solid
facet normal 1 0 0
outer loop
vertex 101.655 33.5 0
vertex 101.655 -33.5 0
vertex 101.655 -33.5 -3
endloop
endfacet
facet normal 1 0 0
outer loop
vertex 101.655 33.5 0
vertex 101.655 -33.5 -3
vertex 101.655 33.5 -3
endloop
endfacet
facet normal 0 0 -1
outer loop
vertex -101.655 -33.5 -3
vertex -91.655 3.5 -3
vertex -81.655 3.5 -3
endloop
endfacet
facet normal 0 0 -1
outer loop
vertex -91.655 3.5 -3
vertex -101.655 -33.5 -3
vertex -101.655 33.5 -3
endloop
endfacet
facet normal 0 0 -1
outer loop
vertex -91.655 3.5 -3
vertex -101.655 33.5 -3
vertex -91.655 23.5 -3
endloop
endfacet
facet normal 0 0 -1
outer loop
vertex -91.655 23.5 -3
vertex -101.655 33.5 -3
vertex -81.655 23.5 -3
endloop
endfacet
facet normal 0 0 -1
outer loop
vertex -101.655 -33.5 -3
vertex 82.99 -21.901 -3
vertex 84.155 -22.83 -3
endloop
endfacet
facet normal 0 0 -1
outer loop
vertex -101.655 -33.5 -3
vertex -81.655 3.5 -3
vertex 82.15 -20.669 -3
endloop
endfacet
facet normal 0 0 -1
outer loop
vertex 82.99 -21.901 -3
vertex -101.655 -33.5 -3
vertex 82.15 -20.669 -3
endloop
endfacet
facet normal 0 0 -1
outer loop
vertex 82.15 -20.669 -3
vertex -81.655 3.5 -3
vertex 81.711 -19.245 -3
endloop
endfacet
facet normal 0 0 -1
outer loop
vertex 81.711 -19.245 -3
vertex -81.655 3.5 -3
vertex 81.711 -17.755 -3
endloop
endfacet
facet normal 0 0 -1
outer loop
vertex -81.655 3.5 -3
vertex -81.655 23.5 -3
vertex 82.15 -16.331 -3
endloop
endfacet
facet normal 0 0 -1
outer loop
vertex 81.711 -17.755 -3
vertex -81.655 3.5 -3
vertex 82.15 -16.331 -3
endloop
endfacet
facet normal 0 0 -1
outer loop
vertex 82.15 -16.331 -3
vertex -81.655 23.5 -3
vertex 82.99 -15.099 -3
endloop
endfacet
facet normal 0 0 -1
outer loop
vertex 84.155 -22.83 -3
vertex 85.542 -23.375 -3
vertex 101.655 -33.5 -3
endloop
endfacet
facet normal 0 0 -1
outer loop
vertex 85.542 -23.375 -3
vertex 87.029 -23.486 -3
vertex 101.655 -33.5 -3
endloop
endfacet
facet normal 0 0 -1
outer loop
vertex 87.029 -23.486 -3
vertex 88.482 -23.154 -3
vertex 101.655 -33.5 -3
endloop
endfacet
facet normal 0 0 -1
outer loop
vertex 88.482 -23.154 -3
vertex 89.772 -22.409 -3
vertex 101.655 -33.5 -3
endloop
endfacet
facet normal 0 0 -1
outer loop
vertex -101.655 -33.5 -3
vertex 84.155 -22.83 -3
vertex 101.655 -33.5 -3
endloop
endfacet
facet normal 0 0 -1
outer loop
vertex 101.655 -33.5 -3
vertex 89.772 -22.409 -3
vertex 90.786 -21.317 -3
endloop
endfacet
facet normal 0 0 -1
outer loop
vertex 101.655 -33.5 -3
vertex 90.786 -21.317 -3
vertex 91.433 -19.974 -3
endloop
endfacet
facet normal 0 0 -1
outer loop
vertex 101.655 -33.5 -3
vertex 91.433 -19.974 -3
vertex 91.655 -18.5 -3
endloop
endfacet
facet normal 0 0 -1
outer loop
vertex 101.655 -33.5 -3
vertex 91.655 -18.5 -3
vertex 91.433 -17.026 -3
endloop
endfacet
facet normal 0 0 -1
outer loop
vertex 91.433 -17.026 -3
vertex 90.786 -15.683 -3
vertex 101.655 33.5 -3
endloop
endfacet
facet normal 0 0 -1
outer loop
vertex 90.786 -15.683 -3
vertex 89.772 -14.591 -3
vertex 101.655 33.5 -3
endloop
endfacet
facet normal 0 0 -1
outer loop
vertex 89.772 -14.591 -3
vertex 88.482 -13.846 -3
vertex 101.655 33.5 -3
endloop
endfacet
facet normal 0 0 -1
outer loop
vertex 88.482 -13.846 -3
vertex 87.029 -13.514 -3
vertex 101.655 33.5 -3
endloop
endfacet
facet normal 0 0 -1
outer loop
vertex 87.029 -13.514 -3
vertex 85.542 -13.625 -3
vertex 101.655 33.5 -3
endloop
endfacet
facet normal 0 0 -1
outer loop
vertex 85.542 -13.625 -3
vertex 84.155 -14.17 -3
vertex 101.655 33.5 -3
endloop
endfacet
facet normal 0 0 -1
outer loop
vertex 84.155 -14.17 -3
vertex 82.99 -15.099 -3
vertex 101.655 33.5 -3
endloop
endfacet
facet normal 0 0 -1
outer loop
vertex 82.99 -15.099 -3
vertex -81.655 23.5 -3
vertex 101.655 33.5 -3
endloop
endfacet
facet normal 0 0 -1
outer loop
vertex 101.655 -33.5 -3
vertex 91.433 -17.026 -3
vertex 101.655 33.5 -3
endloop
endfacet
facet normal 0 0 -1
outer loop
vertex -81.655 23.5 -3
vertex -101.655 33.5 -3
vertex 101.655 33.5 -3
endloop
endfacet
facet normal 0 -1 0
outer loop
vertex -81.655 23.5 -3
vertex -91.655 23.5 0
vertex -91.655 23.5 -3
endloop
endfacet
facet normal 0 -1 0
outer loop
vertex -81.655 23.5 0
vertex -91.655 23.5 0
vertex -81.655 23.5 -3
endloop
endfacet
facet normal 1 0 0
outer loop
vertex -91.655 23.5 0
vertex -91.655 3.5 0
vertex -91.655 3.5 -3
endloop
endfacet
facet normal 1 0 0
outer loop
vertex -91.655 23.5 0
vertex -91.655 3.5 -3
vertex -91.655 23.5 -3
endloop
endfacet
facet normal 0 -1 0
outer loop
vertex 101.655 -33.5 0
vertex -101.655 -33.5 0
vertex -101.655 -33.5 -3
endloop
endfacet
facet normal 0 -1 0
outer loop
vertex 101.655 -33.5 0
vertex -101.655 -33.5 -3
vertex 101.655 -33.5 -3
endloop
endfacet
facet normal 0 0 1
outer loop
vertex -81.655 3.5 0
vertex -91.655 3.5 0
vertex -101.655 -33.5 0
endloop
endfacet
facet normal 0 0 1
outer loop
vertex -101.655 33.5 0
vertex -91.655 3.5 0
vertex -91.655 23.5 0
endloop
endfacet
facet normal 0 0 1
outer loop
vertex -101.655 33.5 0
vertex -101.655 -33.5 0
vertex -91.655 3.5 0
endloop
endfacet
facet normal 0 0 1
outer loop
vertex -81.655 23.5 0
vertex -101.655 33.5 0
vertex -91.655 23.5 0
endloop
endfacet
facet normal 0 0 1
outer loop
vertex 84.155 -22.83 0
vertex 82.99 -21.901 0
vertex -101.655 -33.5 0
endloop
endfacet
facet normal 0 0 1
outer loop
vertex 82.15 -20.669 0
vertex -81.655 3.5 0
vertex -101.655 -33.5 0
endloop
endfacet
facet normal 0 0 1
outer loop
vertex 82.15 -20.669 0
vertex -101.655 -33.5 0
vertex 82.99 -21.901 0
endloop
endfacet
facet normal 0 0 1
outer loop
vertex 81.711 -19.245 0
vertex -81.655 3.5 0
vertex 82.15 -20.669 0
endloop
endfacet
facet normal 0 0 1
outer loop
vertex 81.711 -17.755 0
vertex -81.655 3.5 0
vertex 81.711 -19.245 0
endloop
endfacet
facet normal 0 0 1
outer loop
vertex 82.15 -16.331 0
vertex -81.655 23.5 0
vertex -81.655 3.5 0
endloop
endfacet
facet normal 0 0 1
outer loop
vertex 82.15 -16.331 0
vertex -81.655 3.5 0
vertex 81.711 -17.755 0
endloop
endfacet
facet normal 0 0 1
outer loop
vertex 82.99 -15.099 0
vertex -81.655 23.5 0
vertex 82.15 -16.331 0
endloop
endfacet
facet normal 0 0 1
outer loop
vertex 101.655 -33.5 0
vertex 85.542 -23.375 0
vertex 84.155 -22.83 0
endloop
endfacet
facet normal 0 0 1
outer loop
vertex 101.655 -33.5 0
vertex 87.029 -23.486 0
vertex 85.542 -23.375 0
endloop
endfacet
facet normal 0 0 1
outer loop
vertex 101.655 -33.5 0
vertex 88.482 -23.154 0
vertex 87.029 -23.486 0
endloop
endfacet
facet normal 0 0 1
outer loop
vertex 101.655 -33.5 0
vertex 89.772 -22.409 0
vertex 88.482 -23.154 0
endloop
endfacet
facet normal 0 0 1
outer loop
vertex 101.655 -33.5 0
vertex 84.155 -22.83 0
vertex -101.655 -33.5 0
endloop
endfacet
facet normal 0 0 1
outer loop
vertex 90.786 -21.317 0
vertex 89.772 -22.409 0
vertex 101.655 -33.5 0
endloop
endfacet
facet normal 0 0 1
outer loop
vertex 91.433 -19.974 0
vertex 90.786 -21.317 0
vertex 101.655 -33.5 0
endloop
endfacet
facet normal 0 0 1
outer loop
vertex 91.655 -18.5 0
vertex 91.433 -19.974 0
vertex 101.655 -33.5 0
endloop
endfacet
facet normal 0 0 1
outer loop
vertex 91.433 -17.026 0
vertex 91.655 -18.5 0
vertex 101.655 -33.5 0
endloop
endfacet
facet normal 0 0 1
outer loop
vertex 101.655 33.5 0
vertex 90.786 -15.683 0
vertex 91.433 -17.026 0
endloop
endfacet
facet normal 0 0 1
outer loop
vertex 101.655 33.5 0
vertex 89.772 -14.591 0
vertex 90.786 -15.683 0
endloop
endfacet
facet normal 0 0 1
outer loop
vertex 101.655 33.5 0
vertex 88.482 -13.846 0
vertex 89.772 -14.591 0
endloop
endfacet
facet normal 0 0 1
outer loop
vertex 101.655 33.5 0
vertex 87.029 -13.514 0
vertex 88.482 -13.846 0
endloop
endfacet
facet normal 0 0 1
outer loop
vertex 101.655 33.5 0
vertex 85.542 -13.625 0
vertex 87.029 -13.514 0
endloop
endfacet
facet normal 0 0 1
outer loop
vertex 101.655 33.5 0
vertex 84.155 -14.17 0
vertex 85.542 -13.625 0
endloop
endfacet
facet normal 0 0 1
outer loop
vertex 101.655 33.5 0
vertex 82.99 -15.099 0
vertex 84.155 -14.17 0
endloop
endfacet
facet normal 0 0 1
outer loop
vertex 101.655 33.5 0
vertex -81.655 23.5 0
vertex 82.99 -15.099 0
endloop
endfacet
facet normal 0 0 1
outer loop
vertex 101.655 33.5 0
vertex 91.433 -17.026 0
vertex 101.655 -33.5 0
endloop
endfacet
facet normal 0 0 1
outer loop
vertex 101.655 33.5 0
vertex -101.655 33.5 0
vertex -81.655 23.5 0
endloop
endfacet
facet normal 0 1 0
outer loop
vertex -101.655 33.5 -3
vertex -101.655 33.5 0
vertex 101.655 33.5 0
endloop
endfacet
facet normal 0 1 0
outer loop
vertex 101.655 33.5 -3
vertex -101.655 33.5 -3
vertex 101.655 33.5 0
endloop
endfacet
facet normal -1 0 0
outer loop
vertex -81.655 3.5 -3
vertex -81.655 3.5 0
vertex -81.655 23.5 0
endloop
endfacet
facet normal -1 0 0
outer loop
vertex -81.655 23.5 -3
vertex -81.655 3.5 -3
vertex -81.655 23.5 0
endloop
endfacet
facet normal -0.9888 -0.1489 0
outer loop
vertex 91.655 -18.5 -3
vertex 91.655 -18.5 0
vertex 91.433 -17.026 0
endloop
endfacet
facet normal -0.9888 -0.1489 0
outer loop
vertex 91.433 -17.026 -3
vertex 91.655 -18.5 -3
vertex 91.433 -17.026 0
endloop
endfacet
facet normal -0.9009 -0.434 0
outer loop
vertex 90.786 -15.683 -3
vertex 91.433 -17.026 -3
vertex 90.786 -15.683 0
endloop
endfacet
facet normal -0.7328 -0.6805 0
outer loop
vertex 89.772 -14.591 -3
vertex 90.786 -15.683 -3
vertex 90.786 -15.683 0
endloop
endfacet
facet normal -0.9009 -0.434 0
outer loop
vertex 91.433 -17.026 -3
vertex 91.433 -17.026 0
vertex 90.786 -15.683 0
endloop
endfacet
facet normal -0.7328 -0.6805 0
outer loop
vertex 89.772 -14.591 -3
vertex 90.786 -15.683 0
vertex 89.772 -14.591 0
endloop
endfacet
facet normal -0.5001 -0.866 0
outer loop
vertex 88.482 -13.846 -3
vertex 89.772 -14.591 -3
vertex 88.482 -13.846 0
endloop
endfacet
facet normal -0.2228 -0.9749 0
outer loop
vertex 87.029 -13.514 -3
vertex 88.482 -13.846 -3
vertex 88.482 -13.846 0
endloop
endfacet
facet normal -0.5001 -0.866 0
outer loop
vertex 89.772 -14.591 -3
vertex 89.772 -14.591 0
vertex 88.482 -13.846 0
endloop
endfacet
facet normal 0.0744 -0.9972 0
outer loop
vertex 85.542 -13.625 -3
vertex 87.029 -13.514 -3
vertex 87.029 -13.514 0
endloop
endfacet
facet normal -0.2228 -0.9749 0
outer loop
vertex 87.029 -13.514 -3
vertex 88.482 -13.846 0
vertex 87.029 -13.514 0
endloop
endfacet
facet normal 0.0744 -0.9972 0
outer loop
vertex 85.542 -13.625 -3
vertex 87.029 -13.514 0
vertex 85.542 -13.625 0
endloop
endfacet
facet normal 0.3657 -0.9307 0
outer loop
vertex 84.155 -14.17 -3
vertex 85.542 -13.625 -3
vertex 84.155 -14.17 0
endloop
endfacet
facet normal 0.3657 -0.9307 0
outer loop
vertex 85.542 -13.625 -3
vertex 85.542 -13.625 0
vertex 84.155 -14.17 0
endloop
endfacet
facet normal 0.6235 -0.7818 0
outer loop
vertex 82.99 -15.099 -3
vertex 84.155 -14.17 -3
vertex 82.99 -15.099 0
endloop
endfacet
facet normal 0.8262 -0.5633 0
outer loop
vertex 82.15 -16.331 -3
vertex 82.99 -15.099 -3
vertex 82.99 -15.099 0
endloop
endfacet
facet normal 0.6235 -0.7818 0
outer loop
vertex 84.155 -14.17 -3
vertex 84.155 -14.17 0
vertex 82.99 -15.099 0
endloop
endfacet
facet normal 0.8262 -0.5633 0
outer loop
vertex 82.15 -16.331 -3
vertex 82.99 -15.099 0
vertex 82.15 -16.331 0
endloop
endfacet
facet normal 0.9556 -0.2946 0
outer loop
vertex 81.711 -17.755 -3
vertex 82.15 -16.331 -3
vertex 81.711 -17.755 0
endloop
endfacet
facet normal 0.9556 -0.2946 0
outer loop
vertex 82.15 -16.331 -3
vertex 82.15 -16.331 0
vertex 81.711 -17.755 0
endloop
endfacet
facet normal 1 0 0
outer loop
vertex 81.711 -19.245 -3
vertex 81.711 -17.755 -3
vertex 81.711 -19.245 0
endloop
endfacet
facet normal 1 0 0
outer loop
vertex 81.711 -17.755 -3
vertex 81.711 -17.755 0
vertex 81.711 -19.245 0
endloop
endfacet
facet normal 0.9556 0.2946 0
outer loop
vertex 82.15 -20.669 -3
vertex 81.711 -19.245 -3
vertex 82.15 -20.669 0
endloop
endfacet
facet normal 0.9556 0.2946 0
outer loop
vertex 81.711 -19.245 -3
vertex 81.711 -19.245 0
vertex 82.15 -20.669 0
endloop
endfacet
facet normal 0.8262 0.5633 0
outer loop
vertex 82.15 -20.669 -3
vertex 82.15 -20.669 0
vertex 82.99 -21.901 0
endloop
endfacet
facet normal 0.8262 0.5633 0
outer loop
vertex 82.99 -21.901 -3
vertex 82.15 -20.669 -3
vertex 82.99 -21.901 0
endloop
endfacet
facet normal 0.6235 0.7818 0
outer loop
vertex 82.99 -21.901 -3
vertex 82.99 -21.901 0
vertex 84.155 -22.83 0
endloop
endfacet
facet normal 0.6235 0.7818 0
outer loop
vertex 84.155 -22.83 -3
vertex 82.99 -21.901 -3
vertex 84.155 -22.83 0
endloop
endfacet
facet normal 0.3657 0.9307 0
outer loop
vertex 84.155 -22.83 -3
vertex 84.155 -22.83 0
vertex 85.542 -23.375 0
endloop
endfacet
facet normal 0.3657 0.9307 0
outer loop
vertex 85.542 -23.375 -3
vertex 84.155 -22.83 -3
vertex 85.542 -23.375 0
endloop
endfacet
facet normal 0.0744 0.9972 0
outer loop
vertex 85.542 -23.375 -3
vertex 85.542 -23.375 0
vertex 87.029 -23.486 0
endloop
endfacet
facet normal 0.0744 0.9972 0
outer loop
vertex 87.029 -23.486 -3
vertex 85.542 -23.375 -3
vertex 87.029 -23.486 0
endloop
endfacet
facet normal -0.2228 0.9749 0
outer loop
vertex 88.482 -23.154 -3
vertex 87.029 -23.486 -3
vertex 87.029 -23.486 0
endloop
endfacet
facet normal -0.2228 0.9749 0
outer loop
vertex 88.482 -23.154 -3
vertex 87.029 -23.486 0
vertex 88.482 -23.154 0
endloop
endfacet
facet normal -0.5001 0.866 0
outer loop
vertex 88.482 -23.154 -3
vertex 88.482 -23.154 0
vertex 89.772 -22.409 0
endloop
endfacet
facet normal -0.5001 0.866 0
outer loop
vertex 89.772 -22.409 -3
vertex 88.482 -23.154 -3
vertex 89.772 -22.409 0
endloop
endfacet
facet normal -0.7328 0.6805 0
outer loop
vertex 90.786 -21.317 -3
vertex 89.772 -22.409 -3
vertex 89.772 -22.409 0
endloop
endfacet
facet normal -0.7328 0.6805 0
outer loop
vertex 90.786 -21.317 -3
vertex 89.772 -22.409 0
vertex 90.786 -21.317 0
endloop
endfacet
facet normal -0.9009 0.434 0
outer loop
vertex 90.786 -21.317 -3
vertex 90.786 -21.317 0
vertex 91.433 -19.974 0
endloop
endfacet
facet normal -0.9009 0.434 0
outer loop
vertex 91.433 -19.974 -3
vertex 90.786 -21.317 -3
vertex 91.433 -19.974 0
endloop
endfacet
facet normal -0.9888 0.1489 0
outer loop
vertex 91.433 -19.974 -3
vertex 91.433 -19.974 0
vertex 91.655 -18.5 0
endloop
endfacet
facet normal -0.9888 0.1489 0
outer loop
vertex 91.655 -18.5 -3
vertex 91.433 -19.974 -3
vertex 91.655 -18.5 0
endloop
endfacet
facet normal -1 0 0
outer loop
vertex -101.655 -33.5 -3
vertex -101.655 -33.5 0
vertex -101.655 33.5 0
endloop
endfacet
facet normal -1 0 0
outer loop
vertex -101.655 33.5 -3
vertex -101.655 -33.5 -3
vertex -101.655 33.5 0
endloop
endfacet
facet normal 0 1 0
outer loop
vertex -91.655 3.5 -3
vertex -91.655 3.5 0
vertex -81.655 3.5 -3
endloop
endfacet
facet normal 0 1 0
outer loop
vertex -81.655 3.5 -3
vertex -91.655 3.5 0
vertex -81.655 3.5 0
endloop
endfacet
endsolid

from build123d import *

# Parameters (mm, degrees)
CROQUIS1_W              = 203.31
CROQUIS1_H              = 67
SALIENTE_EXTRUIR1_DEPTH = 3
CORTAR_EXTRUIR1_REACH   = 5
CROQUIS2_W              = 10
CROQUIS2_H              = 20
CORTAR_EXTRUIR2_REACH   = 5
CROQUIS3_R              = 5


with BuildPart() as part:
    # Croquis1 → Saliente-Extruir1 (new body)
    with BuildSketch(Plane.XY):
        Rectangle(CROQUIS1_W, CROQUIS1_H)
    extrude(amount=-SALIENTE_EXTRUIR1_DEPTH)

    # Croquis2 → Cortar-Extruir1 (cut, up to next)
    with BuildSketch(Plane.XY, mode=Mode.PRIVATE) as cortar_extruir1_sk1:
        with Locations((-86.655, 13.5)):
            Rectangle(CROQUIS2_W, CROQUIS2_H)
    cortar_extruir1_tool1 = extrude(cortar_extruir1_sk1.sketch, amount=-CORTAR_EXTRUIR1_REACH, mode=Mode.PRIVATE) & part.part
    add(cortar_extruir1_tool1.solids().sort_by_distance((-86.655, 13.5, 0))[0], mode=Mode.SUBTRACT)

    # Croquis3 → Cortar-Extruir2 (cut, up to next)
    with BuildSketch(Plane.XY, mode=Mode.PRIVATE) as cortar_extruir2_sk1:
        with Locations((86.655, -18.5)):
            Circle(CROQUIS3_R)
    cortar_extruir2_tool1 = extrude(cortar_extruir2_sk1.sketch, amount=-CORTAR_EXTRUIR2_REACH, mode=Mode.PRIVATE) & part.part
    add(cortar_extruir2_tool1.solids().sort_by_distance((86.655, -18.5, 0))[0], mode=Mode.SUBTRACT)


solid = part.part
